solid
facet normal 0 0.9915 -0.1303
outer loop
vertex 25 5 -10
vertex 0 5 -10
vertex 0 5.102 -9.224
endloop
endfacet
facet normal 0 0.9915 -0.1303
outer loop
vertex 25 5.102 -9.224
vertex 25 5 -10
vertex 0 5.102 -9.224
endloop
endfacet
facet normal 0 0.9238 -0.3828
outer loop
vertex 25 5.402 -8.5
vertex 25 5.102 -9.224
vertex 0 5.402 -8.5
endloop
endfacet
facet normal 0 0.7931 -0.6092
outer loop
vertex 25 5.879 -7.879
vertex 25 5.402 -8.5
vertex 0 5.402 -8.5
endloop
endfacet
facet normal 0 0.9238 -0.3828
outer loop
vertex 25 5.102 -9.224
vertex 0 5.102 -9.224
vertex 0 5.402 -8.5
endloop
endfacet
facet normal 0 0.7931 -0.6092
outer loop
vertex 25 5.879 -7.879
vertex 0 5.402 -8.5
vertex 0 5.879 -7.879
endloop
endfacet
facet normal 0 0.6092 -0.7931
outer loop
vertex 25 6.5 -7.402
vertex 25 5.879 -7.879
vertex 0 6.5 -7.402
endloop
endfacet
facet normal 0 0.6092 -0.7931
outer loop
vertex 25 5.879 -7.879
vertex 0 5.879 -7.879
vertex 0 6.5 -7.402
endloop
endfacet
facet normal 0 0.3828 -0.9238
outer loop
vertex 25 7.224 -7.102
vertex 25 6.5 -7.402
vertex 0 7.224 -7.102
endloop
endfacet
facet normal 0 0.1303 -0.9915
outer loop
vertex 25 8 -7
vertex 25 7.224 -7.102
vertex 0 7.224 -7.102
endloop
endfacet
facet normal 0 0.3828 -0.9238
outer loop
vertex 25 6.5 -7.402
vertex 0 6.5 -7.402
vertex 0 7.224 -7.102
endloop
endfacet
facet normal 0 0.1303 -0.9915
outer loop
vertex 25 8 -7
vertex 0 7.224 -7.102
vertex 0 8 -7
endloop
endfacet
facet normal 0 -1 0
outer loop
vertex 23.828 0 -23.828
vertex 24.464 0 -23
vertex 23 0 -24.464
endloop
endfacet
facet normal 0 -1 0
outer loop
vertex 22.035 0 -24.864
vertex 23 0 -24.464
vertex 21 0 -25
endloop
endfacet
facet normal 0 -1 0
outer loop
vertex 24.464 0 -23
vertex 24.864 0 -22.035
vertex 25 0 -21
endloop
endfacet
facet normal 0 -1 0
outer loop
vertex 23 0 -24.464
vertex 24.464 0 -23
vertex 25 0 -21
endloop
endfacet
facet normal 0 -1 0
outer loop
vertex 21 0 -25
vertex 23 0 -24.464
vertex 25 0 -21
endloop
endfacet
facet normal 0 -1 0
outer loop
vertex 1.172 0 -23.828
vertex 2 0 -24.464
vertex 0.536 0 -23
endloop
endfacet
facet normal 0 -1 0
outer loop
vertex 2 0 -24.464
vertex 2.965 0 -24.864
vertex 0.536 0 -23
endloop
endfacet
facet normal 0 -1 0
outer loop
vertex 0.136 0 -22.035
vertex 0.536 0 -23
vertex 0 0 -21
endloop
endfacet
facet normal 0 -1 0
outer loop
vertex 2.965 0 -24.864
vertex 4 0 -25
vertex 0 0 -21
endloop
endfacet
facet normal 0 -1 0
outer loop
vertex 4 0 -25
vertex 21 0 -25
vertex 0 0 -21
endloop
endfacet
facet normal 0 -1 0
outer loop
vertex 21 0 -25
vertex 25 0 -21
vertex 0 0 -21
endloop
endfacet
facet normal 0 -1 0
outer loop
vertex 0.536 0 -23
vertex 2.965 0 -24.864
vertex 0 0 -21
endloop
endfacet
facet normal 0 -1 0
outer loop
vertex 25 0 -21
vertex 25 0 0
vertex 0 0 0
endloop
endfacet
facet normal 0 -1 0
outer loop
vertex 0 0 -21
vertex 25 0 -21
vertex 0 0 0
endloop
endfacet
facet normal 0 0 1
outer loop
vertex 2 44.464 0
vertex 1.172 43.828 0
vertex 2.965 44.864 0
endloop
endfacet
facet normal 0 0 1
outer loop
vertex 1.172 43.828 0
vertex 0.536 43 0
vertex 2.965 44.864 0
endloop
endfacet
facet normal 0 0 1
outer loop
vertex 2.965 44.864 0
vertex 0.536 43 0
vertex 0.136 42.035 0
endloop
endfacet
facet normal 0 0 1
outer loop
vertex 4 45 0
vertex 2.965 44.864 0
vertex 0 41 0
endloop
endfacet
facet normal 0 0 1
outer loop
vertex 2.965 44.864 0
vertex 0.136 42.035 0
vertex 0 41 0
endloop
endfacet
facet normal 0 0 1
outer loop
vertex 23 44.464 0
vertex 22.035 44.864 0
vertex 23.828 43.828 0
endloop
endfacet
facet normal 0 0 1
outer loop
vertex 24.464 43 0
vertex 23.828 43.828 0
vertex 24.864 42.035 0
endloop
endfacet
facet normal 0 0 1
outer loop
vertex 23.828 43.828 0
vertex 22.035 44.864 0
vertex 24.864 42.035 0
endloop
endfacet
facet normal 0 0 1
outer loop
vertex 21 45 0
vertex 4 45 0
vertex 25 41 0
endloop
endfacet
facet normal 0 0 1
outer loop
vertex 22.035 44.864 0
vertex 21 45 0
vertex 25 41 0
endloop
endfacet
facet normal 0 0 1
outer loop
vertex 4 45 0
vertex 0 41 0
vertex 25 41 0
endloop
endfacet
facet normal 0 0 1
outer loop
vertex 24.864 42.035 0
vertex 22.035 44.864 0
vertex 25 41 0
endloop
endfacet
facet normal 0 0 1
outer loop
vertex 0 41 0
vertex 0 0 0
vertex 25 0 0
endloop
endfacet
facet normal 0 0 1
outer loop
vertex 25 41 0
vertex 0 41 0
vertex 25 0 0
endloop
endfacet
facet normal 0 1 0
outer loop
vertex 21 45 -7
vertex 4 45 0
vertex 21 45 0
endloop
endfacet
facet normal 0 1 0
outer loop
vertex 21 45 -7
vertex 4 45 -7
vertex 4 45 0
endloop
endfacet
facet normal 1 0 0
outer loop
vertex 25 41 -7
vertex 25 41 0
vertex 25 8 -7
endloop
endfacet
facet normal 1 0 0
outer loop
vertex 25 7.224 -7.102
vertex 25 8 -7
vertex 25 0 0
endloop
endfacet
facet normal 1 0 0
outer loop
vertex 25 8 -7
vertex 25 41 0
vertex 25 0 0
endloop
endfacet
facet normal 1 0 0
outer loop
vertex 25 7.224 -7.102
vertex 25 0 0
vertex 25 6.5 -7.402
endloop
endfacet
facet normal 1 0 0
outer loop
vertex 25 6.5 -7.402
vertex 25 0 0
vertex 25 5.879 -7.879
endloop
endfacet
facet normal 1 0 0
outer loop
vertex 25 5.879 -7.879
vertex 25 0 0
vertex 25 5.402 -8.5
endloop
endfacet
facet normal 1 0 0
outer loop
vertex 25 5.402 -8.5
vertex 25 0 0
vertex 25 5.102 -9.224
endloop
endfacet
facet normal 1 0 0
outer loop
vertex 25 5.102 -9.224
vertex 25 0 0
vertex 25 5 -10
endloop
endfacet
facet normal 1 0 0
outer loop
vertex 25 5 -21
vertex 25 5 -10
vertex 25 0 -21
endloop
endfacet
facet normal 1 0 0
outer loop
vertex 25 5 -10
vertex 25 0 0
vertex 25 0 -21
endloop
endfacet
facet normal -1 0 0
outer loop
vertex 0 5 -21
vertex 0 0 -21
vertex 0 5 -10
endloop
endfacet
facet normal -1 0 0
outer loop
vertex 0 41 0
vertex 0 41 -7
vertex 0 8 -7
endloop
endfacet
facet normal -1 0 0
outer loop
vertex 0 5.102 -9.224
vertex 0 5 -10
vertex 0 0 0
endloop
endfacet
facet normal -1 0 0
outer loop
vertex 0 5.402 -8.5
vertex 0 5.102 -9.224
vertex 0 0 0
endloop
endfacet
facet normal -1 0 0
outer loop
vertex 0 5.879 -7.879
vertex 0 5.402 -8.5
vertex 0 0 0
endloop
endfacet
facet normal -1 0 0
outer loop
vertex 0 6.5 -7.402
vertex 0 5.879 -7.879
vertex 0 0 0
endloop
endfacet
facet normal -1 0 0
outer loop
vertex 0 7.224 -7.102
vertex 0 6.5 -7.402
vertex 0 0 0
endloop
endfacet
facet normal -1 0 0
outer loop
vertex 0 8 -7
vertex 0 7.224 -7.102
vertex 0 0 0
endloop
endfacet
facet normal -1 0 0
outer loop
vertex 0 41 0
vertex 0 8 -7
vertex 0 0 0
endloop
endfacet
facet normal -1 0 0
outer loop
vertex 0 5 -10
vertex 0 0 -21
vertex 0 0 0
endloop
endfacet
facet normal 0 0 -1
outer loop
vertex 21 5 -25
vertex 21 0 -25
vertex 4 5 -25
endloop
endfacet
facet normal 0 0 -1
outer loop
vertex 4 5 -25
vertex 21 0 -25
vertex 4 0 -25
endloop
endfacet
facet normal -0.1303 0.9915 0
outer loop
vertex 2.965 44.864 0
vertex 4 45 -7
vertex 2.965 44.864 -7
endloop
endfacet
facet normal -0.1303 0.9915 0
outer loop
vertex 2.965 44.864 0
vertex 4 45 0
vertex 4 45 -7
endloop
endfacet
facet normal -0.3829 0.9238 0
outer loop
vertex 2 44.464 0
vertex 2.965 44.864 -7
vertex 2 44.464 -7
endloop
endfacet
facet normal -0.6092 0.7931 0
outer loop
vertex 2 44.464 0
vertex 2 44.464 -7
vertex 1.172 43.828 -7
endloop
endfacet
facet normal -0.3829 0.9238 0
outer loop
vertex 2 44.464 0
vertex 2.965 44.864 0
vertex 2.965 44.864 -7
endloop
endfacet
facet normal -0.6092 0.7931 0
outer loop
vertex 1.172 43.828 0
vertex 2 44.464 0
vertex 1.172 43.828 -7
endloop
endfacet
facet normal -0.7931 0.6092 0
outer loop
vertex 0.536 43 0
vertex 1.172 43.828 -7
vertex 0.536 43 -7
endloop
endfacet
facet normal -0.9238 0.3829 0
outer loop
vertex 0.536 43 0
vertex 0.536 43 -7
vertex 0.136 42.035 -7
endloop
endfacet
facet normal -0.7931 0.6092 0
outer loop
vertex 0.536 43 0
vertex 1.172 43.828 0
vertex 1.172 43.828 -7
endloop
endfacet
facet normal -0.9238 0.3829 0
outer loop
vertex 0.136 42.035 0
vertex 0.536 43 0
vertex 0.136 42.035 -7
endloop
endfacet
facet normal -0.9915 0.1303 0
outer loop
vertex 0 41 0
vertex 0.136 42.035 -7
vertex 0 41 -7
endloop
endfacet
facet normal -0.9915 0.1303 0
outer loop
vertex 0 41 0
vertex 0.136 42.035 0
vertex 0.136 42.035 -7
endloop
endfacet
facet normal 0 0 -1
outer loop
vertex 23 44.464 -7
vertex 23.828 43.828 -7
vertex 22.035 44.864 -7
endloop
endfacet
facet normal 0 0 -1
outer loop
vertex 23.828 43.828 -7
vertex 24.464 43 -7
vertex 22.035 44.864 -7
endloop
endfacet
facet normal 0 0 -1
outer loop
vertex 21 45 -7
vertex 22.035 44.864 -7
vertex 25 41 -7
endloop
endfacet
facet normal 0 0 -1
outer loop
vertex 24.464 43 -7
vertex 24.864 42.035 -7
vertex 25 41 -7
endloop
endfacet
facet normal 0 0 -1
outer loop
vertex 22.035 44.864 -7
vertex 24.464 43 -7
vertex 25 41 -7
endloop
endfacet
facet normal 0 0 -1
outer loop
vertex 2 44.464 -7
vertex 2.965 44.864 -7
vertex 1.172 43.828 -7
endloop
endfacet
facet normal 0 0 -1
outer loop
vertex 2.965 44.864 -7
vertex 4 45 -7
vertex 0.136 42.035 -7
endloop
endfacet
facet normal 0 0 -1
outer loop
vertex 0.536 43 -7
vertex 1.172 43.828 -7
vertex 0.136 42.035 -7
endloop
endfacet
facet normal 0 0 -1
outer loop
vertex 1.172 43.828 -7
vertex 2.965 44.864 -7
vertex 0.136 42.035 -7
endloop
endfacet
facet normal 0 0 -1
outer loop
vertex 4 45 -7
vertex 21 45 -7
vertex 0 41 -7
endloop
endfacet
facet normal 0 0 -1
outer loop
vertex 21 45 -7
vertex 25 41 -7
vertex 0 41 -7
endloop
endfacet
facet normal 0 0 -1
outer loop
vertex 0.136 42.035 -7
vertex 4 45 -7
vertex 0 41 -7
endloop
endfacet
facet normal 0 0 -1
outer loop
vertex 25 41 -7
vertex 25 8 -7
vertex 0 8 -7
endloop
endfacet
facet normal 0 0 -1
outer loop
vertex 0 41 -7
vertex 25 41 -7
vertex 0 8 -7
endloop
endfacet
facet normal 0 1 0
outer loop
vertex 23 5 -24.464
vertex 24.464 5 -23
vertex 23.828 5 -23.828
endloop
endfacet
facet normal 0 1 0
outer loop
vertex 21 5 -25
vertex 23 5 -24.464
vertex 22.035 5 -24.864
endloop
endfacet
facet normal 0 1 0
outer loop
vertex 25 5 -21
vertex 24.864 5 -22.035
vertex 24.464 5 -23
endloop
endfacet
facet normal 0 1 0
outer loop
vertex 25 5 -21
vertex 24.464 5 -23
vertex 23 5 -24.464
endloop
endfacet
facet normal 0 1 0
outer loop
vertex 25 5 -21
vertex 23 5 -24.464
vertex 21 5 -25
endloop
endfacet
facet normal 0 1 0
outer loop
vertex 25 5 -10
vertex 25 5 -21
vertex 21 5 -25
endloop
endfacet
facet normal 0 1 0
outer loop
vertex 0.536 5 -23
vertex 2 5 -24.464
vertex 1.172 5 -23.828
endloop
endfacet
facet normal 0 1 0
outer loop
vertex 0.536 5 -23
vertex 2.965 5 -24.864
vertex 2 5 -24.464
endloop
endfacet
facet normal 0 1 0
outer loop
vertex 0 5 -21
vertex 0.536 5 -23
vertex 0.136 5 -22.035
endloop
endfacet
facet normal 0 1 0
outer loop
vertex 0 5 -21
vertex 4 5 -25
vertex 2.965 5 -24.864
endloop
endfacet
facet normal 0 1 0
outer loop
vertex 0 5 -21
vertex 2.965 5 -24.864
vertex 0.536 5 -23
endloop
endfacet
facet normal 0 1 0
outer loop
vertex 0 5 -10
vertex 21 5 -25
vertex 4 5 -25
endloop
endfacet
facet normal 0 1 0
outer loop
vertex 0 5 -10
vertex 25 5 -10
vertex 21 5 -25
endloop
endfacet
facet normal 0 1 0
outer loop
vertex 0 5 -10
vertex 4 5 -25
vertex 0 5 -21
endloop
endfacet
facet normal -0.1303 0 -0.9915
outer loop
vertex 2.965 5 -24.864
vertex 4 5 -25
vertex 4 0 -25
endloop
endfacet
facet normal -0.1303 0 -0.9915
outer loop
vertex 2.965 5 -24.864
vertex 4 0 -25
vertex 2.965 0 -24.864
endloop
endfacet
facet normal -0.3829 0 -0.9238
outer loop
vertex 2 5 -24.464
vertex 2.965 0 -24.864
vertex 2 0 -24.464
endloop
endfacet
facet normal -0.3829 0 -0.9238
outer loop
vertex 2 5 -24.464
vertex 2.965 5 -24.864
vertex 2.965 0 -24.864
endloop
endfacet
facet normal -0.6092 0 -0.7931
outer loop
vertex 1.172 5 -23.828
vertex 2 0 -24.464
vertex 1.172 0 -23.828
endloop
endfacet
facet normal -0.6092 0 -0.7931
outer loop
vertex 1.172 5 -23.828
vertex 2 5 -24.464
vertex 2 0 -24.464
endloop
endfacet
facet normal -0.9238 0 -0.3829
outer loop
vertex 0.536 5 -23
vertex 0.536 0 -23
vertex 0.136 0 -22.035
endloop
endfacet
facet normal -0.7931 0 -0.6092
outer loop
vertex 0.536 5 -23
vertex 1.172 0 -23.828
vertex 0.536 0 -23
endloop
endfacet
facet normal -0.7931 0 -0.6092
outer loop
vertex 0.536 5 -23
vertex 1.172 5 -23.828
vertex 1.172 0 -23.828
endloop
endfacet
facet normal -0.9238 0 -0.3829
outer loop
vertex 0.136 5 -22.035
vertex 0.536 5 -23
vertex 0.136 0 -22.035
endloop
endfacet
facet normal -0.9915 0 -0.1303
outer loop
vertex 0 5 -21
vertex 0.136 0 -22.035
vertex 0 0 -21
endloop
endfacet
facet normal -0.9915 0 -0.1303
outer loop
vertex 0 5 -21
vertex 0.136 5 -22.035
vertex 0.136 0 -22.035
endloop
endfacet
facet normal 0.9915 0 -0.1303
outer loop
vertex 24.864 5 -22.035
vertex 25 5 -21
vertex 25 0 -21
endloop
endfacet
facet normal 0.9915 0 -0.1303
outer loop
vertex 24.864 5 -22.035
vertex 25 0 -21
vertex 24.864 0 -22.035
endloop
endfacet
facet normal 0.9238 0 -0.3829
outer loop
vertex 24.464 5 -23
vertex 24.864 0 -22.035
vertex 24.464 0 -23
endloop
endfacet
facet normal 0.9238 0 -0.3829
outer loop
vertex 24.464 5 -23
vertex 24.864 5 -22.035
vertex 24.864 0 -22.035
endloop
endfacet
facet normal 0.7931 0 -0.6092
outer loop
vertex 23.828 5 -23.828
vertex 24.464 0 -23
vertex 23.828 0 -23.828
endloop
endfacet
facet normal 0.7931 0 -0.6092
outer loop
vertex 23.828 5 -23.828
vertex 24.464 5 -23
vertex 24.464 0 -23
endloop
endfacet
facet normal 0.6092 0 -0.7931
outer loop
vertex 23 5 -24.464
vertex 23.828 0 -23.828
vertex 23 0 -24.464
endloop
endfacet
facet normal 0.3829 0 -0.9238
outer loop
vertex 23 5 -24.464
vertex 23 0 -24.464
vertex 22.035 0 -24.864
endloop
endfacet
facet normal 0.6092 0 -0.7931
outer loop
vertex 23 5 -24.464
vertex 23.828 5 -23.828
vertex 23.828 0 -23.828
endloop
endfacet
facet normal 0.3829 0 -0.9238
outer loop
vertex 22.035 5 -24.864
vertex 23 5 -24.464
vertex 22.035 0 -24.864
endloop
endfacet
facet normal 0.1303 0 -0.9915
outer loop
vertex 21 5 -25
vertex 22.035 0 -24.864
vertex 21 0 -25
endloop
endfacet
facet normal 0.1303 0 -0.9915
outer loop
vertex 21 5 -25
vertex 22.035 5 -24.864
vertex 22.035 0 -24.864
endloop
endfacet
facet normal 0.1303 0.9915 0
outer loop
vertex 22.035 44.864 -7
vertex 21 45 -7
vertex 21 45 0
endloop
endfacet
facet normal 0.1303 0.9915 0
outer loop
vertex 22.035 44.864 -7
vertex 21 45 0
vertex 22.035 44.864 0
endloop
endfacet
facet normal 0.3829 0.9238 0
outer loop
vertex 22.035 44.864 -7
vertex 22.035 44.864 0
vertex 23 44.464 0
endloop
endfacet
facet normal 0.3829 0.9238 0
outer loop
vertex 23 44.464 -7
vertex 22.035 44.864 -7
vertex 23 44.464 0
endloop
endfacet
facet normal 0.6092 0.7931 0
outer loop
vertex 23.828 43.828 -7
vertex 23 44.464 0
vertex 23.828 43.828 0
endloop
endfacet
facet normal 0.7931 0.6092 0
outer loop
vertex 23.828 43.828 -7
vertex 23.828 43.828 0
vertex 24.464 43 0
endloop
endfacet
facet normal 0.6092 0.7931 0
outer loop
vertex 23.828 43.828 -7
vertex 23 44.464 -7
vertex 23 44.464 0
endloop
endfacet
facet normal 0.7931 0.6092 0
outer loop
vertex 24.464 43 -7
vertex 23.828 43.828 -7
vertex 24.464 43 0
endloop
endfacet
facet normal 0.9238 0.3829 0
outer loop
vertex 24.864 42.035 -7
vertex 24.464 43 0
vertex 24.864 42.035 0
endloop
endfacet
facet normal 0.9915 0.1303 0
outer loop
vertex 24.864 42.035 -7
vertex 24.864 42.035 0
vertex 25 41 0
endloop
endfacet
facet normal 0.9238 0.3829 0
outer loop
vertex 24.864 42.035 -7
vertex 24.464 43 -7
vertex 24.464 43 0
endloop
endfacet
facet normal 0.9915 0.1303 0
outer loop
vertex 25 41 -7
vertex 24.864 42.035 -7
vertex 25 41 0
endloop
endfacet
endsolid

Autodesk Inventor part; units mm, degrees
ref_plane "YZ Plane" through (0, 0, 0) normal (1, 0, 0) x (0, 1, 0)
ref_plane "XZ Plane" through (0, 0, 0) normal (0, 1, 0) x (-1, 0, 0)
ref_plane "XY Plane" through (0, 0, 0) normal (0, 0, 1) x (1, 0, 0)
sketch "Sketch1" plane through (0, 0, 0) normal (0, 1, 0) x (-1, 0, 0)
  line L0 (0, 0) -> (-25, 0)
  line L1 (-25, 0) -> (-25, -25)
  line L2 (-25, -25) -> (0, -25)
  line L3 (0, -25) -> (0, 0)
  dimension "d0" = 25
  dimension "d1" = 25
extrude "Extrusion1" add sketch "Sketch1" along normal blind 5
sketch "Sketch2" plane through (0, 5, 0) normal (0, 1, 0) x (1, 0, 0)
  line L0 (25, 0) -> (25, 25) projected
  line L1 (0, 0) -> (25, 0)
  line L2 (25, 0) -> (25, 7)
  line L3 (25, 7) -> (0, 7)
  line L4 (0, 7) -> (0, 0)
  dimension "d4" = 7
extrude "Extrusion2" add sketch "Sketch2" along normal blind 40
fillet "Fillet1" radius 3 1 edges at (12.5, 5, -7)
fillet "Fillet2" radius 4 1 edges at (25, 45, -3.5)
fillet "Fillet3" radius 4 1 edges at (0, 45, -3.5)
fillet "Fillet4" radius 4 2 edges at (25, 2.5, -25) (0, 2.5, -25)
properties part number "Support1"
